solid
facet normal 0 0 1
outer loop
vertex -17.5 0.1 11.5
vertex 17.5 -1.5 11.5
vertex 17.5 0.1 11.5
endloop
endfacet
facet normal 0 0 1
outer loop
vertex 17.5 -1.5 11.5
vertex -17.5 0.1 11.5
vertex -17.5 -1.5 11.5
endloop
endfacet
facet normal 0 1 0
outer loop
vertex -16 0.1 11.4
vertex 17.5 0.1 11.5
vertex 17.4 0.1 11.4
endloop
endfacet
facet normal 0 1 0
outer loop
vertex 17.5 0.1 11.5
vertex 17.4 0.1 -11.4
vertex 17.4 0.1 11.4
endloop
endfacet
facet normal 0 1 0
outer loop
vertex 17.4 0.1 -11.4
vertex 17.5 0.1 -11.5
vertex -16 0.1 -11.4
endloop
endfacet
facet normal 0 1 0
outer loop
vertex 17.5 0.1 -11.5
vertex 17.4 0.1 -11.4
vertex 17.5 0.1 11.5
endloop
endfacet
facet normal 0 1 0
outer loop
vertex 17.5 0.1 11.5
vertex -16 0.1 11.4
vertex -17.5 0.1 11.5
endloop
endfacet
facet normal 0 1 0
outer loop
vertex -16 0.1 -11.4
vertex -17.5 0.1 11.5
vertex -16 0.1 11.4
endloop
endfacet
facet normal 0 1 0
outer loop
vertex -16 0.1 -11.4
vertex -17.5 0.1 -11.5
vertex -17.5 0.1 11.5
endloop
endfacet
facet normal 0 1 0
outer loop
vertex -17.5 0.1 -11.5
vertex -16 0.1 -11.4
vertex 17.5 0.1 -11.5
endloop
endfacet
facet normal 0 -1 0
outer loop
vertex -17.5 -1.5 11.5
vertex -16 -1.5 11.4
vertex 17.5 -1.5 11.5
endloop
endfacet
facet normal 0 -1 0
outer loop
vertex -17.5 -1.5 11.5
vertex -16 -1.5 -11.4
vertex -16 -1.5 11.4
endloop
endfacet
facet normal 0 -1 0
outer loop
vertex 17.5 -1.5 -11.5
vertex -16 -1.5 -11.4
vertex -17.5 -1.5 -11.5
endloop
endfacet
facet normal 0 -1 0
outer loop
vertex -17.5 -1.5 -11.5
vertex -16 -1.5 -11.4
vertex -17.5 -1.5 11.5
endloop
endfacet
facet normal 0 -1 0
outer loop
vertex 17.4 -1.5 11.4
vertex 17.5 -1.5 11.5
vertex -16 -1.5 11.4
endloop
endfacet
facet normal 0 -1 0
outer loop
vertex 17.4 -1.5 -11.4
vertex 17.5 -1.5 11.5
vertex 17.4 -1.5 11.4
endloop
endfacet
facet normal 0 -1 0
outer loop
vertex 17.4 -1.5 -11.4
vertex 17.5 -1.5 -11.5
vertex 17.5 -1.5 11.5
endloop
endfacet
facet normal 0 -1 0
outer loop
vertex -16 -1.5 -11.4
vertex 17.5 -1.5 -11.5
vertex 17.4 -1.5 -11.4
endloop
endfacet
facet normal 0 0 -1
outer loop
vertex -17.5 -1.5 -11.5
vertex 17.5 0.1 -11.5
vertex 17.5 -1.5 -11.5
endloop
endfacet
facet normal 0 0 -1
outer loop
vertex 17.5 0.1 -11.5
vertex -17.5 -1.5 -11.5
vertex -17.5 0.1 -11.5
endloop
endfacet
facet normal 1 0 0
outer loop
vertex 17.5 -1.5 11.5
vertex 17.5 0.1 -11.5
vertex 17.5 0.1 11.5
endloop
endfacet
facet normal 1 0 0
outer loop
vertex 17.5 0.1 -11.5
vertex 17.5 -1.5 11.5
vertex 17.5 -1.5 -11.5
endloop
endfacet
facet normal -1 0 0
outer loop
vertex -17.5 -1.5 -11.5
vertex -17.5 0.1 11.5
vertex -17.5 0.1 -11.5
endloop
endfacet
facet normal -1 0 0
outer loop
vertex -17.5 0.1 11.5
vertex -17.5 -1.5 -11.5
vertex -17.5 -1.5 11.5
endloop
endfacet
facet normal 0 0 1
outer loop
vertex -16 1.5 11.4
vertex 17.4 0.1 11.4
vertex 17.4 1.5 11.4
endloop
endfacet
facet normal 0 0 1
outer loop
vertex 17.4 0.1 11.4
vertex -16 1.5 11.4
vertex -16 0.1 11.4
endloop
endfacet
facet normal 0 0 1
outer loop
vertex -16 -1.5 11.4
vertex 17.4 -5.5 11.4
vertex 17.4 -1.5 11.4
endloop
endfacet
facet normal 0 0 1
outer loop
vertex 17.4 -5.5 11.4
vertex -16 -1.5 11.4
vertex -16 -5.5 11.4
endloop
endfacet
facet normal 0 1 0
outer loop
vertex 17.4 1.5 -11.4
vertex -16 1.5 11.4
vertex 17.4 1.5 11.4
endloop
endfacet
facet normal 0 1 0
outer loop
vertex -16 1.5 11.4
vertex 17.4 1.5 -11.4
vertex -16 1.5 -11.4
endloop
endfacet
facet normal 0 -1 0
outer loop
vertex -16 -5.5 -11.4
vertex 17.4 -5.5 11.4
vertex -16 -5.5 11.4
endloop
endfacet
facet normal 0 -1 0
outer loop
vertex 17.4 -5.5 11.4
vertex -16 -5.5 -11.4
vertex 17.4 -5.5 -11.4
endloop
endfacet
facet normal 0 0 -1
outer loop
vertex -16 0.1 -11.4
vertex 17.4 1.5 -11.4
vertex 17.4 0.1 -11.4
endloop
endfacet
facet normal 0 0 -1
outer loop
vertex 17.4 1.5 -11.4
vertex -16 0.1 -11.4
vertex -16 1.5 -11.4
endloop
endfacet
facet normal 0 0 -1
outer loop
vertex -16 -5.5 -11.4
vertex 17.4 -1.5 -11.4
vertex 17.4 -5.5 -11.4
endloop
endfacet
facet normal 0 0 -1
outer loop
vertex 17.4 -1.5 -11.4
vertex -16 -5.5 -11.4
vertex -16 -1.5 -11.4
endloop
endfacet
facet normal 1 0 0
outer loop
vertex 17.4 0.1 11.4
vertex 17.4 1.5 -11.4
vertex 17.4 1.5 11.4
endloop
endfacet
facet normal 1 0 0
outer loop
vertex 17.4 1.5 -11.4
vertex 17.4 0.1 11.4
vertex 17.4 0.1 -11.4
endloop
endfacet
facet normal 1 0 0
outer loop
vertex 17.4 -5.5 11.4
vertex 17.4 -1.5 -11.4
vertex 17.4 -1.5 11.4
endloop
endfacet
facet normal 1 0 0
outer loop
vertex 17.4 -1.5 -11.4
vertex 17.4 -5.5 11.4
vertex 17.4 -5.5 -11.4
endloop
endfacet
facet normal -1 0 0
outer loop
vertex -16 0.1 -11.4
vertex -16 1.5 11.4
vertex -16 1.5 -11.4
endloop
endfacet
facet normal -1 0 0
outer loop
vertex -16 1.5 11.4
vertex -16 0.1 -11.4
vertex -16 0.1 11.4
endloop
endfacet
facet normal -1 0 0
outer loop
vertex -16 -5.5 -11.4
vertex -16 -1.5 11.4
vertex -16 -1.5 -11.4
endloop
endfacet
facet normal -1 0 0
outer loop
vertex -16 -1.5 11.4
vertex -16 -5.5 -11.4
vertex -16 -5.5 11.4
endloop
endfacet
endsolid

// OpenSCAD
rotate([-90,0,0])
rotate([0,0,-90])
translate([-11.5,-17.5,-5.5])
{
	translate([0,0,4])cube([23,35,1.6]);
	translate([0.1,1.5,0])cube([22.8,33.4,7]);
}
